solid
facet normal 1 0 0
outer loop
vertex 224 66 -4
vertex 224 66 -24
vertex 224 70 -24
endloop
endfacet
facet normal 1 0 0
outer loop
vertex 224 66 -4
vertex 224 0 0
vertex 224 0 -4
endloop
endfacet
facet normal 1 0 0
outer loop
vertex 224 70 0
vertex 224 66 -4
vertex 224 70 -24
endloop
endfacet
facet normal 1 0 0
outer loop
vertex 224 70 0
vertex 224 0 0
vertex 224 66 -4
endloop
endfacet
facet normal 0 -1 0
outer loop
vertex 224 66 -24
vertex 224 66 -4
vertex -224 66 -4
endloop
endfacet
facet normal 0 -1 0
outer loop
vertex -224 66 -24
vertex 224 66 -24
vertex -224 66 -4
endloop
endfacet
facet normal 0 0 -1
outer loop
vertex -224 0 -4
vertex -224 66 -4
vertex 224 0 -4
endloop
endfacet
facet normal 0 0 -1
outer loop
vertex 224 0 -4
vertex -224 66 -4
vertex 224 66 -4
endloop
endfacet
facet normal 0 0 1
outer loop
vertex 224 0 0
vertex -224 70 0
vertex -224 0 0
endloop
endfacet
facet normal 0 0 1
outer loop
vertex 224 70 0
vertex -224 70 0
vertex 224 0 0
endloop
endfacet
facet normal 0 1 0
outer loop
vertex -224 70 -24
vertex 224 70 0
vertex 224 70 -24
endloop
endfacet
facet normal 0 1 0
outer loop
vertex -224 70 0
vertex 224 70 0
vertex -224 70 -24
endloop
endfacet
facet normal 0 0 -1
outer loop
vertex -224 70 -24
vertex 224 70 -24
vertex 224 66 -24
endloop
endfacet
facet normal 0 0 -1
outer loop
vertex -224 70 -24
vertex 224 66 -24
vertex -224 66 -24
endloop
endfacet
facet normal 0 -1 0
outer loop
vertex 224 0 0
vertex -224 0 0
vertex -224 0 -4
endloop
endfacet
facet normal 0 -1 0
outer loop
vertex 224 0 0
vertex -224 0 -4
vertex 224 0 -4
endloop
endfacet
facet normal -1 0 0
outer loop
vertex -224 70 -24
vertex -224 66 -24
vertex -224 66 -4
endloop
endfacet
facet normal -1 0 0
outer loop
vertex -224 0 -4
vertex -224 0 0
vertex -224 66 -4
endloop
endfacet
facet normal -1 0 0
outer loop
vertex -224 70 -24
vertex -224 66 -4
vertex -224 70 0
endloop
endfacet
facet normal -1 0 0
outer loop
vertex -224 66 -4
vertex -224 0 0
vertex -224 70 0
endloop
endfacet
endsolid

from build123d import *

# Parameters (mm, degrees)
SKETCH1_W           = 448
SKETCH1_H           = 70
BASE_FLANGE1_DEPTH  = 4
SKETCH6_W           = 448
SKETCH6_H           = 4
BOSS_EXTRUDE1_DEPTH = 20


# Sheet-metal steps are written as plain solids
with BuildPart() as part:
    # Sketch1 → Base-Flange1 (new body)
    with BuildSketch(Plane.XY):
        with Locations((0, 35)):
            Rectangle(SKETCH1_W, SKETCH1_H)
    extrude(amount=-BASE_FLANGE1_DEPTH)

    # Sketch6 → Boss-Extrude1 (add)
    with BuildSketch(Plane(origin=(0, 0, -4), x_dir=(-1, 0, 0), z_dir=(0, 0, -1))):
        with Locations((0, 68)):
            Rectangle(SKETCH6_W, SKETCH6_H)
    extrude(amount=BOSS_EXTRUDE1_DEPTH)


solid = part.part
